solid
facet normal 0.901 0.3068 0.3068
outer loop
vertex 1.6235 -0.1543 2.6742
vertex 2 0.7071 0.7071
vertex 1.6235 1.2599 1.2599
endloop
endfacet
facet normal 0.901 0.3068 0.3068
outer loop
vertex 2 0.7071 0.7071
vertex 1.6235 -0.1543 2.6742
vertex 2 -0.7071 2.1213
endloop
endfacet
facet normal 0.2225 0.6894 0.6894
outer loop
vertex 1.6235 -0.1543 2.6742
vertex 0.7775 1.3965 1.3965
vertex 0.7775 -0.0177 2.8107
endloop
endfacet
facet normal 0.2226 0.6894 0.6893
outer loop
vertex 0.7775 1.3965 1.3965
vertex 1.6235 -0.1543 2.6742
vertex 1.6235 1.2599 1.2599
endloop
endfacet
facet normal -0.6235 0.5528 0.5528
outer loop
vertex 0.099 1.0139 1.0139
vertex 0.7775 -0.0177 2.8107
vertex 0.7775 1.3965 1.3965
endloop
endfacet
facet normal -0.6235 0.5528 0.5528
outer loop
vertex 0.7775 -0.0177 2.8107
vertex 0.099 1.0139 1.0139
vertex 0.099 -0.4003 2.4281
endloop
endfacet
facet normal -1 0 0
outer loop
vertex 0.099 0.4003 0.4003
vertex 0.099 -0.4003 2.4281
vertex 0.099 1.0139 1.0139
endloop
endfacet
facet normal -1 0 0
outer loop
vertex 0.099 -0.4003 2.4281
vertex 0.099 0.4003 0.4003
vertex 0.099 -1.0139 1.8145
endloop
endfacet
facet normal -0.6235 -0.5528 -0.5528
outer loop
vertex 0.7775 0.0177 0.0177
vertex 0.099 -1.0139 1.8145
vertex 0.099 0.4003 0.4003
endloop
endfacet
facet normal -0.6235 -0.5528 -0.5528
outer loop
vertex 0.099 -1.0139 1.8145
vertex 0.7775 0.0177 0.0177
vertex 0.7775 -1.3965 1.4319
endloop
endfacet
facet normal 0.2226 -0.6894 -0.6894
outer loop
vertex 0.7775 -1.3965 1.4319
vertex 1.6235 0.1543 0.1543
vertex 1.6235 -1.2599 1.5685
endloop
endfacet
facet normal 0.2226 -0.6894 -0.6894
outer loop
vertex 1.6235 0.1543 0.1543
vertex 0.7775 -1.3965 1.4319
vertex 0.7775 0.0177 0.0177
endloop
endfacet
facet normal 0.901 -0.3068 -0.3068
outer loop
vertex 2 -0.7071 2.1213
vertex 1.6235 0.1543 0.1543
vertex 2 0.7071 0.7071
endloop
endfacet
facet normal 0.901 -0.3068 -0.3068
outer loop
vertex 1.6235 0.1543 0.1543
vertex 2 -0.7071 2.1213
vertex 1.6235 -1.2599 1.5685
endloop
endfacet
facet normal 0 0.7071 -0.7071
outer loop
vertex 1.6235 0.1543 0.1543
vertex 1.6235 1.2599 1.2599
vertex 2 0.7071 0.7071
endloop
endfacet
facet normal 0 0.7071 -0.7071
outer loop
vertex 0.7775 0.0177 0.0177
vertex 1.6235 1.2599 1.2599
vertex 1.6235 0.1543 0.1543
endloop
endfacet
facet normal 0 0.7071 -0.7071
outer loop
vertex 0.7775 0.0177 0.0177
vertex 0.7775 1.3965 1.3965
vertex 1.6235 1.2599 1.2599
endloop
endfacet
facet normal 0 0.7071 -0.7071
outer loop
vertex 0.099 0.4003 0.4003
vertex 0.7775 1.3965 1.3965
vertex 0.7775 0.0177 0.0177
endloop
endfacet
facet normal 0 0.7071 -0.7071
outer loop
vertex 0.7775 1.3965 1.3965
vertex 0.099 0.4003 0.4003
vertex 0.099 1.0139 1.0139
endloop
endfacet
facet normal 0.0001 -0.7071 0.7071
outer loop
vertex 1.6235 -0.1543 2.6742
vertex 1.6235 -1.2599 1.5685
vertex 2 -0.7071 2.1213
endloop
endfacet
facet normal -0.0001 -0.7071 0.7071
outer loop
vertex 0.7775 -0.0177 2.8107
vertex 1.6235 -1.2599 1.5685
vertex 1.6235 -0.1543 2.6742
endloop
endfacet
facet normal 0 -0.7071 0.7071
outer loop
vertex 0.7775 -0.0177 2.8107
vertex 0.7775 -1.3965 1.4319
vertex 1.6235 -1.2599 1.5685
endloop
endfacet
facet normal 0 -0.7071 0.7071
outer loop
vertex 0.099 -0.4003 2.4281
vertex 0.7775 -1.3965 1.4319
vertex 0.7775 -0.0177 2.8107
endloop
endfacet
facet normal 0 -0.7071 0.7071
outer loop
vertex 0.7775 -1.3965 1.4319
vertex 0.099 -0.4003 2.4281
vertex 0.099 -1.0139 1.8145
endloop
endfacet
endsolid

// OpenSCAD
$fn=7;
translate([1,0.70710677,0.70710677])
{
	rotate(44.999996,[1,0,0])
	{
		cylinder(h=2,d=2);
	}
}
